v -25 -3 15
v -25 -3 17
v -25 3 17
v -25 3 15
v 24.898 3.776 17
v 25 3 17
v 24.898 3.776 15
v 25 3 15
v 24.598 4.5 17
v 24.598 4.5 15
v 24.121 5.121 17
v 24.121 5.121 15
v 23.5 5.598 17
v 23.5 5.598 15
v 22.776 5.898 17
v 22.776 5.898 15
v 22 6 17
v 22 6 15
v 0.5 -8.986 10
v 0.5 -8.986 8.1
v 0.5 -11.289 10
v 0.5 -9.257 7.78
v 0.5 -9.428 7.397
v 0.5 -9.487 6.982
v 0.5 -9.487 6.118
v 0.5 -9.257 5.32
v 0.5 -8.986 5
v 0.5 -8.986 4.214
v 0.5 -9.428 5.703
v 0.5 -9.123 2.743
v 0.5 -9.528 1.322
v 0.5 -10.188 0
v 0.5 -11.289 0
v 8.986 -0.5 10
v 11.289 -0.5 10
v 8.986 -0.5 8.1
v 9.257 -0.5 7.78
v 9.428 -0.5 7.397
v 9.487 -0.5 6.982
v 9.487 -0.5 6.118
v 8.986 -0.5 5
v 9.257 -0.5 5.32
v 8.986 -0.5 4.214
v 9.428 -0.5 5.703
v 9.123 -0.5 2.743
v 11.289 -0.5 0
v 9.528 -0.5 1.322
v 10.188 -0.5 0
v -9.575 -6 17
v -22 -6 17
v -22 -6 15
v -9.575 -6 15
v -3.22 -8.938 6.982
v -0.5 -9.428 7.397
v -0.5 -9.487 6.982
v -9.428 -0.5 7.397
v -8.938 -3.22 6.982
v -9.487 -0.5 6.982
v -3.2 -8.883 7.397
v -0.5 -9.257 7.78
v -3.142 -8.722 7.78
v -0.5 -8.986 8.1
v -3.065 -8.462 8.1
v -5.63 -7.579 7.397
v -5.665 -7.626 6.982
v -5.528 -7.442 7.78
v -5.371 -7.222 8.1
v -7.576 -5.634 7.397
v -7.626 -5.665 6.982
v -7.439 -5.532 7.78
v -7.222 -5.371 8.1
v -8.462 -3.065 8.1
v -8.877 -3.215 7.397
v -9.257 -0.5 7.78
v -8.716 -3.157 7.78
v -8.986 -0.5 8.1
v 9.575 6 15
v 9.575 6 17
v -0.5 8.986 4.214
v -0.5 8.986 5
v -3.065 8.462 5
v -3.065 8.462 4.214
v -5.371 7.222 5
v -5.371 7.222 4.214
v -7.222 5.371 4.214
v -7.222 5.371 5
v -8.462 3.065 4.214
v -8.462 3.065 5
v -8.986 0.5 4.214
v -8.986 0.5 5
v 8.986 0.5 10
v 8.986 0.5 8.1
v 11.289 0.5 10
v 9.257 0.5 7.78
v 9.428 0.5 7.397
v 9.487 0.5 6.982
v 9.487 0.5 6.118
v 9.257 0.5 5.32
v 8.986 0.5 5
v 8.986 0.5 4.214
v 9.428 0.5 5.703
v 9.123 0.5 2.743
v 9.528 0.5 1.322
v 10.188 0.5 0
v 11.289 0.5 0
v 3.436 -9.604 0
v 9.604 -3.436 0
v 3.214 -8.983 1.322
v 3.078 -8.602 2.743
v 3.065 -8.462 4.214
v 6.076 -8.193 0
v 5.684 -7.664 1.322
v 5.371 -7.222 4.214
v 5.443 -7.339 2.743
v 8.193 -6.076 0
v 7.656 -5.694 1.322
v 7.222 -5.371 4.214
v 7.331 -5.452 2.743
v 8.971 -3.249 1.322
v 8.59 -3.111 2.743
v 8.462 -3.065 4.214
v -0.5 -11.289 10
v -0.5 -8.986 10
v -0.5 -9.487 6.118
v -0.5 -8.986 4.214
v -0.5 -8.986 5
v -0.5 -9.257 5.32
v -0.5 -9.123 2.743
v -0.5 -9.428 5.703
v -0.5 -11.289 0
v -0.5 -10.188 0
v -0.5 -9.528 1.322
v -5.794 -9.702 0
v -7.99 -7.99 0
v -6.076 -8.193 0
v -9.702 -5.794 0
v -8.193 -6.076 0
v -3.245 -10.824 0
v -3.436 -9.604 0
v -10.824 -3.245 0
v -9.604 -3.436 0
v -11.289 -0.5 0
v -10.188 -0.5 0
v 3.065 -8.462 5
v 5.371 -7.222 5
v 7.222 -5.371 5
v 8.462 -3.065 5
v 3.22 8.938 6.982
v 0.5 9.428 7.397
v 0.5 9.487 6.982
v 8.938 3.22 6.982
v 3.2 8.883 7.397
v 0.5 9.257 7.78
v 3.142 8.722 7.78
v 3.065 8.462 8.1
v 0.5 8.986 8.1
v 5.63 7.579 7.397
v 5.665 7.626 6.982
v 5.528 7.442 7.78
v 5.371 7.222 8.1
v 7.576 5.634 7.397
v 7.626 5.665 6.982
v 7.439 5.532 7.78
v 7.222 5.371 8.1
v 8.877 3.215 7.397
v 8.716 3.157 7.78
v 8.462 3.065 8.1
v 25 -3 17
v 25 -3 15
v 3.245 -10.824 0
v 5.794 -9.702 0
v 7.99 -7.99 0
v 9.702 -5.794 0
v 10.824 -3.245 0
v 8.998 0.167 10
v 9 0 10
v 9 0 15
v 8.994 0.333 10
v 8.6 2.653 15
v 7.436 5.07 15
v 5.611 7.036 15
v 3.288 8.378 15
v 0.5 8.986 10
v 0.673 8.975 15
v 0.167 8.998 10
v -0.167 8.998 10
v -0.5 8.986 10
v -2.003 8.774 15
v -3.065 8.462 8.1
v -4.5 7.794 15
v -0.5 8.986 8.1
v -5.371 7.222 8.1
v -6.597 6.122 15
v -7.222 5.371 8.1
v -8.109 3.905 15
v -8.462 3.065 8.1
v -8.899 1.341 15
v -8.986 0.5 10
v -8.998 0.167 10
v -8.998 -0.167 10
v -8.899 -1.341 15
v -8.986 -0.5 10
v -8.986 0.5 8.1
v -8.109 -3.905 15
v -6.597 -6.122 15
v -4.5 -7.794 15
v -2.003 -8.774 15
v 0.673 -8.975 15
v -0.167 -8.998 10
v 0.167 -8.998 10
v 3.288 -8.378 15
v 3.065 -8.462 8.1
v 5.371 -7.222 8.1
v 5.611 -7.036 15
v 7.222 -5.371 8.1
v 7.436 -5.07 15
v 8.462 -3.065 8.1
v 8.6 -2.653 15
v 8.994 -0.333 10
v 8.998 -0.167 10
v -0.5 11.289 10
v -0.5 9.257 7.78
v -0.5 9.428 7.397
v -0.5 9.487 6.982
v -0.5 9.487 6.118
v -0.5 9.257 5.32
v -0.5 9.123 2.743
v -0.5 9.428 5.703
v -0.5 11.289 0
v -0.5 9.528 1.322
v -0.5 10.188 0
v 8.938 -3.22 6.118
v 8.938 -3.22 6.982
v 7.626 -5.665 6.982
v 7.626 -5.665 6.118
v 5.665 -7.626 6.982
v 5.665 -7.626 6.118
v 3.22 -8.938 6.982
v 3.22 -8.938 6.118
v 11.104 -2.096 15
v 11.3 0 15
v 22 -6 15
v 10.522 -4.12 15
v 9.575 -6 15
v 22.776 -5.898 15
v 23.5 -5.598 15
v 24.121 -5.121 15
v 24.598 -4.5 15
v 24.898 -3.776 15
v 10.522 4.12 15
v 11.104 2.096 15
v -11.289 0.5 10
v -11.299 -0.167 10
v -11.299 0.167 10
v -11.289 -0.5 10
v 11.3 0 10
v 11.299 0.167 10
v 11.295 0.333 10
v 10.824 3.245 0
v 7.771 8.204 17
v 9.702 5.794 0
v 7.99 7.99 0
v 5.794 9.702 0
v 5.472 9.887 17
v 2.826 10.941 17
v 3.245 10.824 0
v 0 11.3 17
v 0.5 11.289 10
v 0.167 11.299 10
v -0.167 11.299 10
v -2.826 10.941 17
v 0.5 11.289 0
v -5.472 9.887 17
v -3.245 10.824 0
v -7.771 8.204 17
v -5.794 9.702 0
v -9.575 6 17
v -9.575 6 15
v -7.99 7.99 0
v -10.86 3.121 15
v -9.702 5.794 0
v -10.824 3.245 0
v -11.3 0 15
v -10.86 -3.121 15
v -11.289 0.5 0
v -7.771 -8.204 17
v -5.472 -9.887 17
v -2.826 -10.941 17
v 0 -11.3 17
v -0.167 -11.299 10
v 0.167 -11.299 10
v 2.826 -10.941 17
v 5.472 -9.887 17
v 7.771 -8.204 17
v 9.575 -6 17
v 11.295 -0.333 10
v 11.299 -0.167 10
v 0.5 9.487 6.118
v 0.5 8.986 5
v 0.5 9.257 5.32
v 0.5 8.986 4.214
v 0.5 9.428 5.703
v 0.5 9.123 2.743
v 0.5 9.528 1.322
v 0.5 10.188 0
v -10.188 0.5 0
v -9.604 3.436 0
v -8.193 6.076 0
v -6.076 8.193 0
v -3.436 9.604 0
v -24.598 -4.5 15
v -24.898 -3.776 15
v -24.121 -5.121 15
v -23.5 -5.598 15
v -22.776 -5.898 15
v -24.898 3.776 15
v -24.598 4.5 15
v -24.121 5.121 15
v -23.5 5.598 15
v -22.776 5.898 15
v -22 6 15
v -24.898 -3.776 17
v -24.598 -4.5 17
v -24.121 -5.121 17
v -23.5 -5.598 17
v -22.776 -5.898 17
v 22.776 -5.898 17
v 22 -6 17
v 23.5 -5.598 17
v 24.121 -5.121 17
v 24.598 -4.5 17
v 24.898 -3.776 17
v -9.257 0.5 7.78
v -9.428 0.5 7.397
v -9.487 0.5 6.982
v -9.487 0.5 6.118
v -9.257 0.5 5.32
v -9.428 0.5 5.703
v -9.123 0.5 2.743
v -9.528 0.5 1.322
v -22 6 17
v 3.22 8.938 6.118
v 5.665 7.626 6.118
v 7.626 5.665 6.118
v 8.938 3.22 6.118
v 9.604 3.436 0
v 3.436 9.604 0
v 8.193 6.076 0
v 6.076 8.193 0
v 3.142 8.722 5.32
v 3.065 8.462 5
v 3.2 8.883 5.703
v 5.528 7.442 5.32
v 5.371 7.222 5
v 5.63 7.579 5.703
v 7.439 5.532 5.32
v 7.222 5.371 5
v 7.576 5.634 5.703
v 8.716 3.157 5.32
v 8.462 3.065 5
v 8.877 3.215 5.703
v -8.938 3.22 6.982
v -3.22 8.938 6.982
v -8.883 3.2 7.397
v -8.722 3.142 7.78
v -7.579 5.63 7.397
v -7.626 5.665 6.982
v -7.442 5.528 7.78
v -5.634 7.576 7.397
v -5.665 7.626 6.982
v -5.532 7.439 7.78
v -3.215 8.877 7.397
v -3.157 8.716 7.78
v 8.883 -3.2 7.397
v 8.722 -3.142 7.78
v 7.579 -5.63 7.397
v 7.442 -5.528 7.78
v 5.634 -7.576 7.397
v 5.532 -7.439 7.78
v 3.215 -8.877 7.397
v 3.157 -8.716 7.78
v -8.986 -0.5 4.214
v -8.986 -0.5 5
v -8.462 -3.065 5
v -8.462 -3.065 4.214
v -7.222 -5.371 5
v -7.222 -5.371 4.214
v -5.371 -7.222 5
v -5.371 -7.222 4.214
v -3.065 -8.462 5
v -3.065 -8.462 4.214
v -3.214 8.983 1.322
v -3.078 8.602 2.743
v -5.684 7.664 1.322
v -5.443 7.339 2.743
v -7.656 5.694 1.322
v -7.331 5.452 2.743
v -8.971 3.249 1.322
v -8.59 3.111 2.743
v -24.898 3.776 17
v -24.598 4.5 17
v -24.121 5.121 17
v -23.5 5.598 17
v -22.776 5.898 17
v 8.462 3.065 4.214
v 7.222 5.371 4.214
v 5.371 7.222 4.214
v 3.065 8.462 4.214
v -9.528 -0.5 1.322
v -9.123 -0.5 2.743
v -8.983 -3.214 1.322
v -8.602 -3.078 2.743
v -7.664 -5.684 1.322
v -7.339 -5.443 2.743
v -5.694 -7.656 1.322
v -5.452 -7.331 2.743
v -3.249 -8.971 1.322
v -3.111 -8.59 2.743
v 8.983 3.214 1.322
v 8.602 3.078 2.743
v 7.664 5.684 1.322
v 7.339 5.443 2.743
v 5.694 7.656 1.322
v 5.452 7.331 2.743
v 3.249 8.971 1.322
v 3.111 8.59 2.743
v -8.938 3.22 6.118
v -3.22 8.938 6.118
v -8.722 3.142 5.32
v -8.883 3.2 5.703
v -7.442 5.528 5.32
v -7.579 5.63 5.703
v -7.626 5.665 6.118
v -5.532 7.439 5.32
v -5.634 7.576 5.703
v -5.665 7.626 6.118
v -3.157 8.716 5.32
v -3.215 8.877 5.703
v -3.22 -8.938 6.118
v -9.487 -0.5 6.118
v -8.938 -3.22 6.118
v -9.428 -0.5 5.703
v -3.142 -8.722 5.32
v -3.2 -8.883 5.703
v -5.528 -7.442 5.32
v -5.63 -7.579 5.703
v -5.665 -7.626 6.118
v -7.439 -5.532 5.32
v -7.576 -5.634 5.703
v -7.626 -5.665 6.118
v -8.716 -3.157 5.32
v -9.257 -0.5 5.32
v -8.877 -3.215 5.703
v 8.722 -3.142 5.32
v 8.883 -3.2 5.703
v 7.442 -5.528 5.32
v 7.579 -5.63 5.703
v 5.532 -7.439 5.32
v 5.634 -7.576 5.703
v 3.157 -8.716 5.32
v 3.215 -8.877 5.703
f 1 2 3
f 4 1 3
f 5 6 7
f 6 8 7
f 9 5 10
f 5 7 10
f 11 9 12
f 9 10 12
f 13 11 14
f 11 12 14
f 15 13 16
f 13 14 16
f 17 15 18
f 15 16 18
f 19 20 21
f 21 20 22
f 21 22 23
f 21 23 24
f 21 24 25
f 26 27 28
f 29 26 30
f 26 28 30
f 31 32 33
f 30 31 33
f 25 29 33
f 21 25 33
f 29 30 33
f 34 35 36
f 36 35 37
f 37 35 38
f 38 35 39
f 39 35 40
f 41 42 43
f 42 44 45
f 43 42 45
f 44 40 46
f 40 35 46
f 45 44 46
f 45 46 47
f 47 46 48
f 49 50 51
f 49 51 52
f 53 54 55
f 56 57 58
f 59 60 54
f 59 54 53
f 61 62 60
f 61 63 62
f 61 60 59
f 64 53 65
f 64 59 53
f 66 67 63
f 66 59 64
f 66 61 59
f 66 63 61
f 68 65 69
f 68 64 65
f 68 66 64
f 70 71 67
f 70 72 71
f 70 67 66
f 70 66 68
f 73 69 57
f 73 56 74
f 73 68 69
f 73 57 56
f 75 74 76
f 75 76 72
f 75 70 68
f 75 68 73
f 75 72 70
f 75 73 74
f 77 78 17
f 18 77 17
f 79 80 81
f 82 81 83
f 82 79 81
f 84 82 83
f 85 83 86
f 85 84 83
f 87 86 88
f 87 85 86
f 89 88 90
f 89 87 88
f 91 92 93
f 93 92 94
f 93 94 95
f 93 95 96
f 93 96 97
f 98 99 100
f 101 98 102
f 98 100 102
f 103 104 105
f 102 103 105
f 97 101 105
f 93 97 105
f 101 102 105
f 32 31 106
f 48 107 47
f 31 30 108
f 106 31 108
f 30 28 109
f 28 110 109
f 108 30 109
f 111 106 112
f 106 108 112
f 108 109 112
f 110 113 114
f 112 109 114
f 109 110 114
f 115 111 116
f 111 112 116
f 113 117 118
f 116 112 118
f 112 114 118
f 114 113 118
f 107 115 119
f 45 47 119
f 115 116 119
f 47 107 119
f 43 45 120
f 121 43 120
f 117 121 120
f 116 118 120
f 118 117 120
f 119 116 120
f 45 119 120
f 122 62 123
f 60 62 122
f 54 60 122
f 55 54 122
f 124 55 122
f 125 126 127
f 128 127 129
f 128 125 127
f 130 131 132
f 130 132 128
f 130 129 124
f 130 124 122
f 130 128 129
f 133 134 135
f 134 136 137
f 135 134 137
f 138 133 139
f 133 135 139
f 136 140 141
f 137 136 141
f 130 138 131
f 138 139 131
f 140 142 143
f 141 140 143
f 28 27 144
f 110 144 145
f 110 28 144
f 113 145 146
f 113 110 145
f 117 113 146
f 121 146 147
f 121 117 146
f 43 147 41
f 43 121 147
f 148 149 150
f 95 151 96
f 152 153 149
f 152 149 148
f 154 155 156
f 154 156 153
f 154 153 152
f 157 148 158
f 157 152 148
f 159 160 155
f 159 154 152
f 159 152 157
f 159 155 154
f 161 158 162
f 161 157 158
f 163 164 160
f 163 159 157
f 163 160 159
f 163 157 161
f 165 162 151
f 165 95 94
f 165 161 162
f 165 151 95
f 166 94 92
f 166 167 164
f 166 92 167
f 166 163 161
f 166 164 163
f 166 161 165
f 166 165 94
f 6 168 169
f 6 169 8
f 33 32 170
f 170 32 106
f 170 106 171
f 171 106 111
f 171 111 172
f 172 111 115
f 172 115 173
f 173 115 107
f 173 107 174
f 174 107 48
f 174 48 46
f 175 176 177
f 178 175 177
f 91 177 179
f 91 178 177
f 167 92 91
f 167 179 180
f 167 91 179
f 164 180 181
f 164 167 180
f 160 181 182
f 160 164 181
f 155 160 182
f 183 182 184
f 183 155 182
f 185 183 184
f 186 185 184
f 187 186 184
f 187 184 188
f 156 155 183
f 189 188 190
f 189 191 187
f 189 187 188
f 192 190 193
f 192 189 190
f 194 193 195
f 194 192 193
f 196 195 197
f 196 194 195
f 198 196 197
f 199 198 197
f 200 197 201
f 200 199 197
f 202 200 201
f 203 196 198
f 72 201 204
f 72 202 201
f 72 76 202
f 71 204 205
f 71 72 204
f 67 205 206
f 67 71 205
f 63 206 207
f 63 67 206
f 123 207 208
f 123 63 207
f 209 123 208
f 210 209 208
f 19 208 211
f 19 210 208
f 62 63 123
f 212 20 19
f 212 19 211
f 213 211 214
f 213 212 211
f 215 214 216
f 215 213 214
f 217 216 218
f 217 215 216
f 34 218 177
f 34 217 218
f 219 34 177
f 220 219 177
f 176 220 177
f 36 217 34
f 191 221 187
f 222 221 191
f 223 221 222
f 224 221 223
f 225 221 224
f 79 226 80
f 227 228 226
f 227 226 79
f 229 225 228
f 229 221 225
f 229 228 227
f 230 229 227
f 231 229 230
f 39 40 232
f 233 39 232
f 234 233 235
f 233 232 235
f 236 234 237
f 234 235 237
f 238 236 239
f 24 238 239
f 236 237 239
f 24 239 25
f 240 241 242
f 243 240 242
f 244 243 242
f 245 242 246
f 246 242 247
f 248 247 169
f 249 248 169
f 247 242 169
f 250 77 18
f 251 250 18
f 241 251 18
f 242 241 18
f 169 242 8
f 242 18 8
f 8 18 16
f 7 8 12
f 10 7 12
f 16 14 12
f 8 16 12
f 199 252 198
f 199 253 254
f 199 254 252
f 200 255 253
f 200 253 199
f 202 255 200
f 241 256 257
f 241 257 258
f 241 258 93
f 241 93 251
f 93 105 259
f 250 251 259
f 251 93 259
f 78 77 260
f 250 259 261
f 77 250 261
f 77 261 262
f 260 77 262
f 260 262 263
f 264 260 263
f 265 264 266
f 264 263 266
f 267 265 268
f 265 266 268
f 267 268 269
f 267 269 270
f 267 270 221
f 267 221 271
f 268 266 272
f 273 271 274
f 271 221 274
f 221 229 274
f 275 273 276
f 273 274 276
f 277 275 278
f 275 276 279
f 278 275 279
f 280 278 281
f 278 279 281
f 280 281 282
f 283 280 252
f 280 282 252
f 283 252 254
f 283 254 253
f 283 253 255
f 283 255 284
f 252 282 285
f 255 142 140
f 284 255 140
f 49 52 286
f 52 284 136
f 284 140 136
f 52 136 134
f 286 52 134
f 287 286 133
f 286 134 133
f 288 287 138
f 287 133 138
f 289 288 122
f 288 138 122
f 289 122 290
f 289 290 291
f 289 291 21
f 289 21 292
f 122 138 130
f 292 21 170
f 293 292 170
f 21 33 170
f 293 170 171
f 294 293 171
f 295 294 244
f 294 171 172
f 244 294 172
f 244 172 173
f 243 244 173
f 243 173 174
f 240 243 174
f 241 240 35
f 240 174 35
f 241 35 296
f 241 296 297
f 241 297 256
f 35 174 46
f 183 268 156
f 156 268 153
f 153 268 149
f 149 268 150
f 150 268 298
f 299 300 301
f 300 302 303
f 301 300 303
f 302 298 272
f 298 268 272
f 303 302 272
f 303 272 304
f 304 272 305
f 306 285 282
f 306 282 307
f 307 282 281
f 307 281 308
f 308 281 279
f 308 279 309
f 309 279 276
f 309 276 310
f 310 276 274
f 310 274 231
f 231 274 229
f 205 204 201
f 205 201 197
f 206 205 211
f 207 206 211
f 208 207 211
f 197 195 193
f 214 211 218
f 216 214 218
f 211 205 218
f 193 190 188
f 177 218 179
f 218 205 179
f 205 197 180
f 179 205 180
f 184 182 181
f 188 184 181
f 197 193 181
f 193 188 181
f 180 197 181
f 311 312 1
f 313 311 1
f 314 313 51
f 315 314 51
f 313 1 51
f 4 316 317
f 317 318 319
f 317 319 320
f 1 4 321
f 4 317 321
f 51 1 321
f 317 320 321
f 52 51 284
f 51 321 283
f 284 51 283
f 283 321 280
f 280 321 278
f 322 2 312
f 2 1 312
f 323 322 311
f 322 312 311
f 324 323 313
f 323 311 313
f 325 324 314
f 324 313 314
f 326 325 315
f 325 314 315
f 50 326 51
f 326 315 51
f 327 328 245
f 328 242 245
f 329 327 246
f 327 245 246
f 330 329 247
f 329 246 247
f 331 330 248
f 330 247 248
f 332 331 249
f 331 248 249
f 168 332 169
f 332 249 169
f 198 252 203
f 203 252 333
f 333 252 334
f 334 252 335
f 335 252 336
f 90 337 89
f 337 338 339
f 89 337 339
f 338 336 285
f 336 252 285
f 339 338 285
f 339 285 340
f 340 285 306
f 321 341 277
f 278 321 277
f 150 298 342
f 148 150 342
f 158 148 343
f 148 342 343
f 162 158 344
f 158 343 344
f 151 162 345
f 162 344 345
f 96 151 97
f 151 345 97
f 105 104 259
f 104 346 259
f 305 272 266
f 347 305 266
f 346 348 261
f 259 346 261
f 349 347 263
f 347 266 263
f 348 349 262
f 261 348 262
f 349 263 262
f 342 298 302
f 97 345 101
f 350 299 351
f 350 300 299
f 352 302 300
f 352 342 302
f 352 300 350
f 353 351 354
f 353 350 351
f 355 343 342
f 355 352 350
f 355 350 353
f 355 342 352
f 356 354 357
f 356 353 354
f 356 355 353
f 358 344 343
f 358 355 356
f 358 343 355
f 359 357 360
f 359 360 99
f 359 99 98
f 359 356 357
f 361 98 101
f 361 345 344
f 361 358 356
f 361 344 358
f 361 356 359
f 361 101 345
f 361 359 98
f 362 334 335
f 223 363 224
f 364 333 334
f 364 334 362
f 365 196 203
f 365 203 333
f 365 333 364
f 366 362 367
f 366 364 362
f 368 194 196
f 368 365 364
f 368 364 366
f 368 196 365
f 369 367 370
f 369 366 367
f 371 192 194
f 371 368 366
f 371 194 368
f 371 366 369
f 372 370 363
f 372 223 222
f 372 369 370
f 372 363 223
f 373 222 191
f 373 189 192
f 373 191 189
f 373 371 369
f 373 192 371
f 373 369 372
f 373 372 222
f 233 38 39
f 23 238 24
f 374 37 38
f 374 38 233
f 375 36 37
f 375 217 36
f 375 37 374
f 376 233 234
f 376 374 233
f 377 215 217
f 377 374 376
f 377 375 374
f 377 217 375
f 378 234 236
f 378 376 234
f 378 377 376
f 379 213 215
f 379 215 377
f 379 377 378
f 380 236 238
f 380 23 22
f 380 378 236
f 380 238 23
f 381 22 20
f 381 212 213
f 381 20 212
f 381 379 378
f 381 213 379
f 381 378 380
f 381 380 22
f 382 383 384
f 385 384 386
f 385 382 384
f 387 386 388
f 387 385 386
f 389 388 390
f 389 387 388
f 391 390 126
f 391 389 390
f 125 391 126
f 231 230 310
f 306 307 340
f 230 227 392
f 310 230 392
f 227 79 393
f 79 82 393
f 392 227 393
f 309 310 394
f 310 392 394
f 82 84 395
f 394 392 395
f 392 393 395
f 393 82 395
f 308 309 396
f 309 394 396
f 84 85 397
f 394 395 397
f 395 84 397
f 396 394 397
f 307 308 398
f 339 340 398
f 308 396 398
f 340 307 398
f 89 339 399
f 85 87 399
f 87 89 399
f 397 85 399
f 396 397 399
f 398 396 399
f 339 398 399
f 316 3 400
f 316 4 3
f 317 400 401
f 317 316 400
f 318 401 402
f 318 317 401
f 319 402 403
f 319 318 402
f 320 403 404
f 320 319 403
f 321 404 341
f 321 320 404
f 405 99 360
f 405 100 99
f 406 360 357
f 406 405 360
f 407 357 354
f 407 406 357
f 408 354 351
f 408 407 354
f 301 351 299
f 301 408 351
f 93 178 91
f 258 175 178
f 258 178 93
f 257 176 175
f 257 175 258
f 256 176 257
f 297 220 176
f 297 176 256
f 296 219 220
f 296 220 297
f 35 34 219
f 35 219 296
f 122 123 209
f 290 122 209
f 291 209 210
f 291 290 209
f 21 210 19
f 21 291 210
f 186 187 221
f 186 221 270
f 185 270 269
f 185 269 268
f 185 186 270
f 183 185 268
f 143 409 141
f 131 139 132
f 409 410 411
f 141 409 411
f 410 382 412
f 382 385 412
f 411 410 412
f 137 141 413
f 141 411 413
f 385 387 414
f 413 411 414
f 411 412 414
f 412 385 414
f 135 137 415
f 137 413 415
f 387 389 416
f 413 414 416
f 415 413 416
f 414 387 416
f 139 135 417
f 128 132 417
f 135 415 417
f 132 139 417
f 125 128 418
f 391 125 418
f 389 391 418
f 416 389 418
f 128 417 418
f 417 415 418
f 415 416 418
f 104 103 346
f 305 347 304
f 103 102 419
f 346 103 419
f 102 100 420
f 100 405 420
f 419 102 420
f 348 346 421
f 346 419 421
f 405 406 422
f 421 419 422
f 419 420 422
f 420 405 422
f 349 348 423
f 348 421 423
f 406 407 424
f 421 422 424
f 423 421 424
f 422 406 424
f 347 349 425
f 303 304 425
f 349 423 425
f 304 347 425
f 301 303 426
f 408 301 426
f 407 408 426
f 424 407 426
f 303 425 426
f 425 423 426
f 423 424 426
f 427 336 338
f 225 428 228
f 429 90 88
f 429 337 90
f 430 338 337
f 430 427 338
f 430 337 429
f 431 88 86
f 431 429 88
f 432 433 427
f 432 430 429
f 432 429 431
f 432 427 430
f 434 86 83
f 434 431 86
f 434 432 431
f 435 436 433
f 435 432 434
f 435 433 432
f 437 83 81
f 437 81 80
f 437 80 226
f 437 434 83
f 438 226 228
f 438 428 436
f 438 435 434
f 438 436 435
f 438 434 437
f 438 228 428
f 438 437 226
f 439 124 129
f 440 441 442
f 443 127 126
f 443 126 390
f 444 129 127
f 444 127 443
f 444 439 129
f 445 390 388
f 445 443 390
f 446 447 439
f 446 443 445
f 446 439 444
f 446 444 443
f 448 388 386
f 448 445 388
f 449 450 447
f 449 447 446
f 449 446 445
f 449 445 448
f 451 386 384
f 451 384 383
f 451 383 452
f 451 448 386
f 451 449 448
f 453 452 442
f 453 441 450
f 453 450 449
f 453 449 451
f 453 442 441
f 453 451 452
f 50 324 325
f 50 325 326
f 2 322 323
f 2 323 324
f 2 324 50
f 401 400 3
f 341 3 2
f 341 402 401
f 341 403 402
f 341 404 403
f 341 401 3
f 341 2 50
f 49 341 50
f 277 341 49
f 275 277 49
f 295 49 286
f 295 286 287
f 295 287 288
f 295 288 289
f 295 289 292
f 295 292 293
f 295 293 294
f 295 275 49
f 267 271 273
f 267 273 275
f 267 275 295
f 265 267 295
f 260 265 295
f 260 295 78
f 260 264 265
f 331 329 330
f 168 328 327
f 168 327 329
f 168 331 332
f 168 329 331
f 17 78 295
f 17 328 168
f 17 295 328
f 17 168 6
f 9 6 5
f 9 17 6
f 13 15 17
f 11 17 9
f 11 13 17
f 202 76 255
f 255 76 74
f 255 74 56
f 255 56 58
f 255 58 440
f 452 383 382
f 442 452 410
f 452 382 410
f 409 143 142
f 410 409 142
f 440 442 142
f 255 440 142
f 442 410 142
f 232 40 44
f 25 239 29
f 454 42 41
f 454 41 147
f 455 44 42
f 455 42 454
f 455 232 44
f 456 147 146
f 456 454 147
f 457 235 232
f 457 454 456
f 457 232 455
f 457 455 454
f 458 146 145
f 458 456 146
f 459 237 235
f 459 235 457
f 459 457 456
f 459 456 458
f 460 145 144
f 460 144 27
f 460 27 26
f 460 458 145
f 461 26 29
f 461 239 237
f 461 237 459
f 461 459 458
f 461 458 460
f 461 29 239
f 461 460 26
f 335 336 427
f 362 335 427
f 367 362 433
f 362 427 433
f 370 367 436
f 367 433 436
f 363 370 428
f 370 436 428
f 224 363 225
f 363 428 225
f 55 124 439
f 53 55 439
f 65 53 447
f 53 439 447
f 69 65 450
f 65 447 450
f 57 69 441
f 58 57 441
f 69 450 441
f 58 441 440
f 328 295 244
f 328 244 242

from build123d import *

# Parameters (mm, degrees)
F0_R         = 11.3
F0_R_2       = 9
F1_DEPTH     = 15
F2_R         = 11.3
F3_DEPTH     = 2
F5_START     = -5
F4_R         = 9.5
F4_R_2       = 7.1437360255
F5_DEPTH     = 3.1
F7_W         = 50
F7_H         = 12
F8_DEPTH     = 2
F9_R         = 3
F10_W        = 1
F10_H        = 12
F10_W_2      = 12
F10_H_2      = 1
F11_DEPTH    = 10
F12_SIZE     = 1.2
F13_T2_ANGLE = 179.6107254138
F13_T4_ANGLE = 179.6107254138
F13_T6_ANGLE = 179.6107254138
F13_T8_ANGLE = 179.6107254138


# Not quite as in the source:
# - a fillet or chamfer that OpenCascade refuses, or shapes differently, is made with other operations: its cross-section is extruded or revolved along the edge and cut away or added


with BuildPart() as f1:
    # F0 (on Top) → F1 (new body)
    with BuildSketch(Plane.XY):
        Circle(F0_R)
        Circle(F0_R_2, mode=Mode.SUBTRACT)
    extrude(amount=F1_DEPTH)

    # F2 (on face) → F3 (join)
    with BuildSketch(Plane.XY.offset(15)):
        Circle(F2_R)
    extrude(amount=F3_DEPTH)

    # F4 (on face) → F5 (cut)
    with BuildSketch(Plane(origin=(0, 0, 0), x_dir=(1, 0, 0), z_dir=(0, 0, -1)).offset(F5_START)):
        Circle(F4_R)
        Circle(F4_R_2, mode=Mode.SUBTRACT)
    extrude(amount=-F5_DEPTH, mode=Mode.SUBTRACT)

    # F6: fillet of radius 1.5 on 3 edges, made by hand

    # F6_s1 → F6_t2 (revolve)
    with BuildSketch(Plane.XZ):
        with BuildLine():
            ThreePointArc((9, 5), (9.3693063938, 5.5056615531), (9.5, 6.1180339887))
            Line((9.5, 6.1180339887), (9.53, 6.1180339887))
            Line((9.53, 6.1180339887), (9.53, 5))
            Line((9.53, 5), (9.5, 4.97))
            ThreePointArc((9.5, 4.97), (9.25, 4.97), (9.02, 4.9776393202))
            Line((9.02, 4.9776393202), (9, 5))
        make_face()
    revolve(axis=Axis((0, 0, 5), (0, 0, -1)))

    # F6_s3 → F6_t4 (revolve)
    with BuildSketch(Plane.XZ):
        with BuildLine():
            ThreePointArc((9.5, 6.9819660113), (9.3693063938, 7.5943384469), (9, 8.1))
            Line((9, 8.1), (9.02, 8.1223606798))
            ThreePointArc((9.02, 8.1223606798), (9.25, 8.13), (9.5, 8.13))
            Line((9.5, 8.13), (9.53, 8.1))
            Line((9.53, 8.1), (9.53, 6.9819660113))
            Line((9.53, 6.9819660113), (9.5, 6.9819660113))
        make_face()
    revolve(axis=Axis((0, 0, 8.1), (0, 0, -1)))

    # F7 (on face) → F8 (join)
    with BuildSketch(Plane.XY.offset(17)):
        Rectangle(F7_W, F7_H)
    extrude(amount=-F8_DEPTH)

    # F9
    f9_edges = [f1.edges().sort_by_distance(p)[0] for p in [
        (-25, 6, 16),
        (-25, -6, 16),
        (25, 6, 16),
        (25, -6, 16),
    ]]
    fillet(f9_edges, radius=F9_R)

    # F10 (on face) → F11 (cut)
    with BuildSketch(Plane(origin=(0, 0, 0), x_dir=(1, 0, 0), z_dir=(0, 0, -1))):
        with Locations((0, -6.5)):
            Rectangle(F10_W, F10_H)
        with Locations((-6.5, 0)):
            Rectangle(F10_W_2, F10_H_2)
        Rectangle(F10_W, F10_H_2)
        with Locations((6.5, 0)):
            Rectangle(F10_W_2, F10_H_2)
        with Locations((0, 6.5)):
            Rectangle(F10_W, F10_H)
    extrude(amount=-F11_DEPTH, mode=Mode.SUBTRACT)

    # F12
    f12_edges = [f1.edges().sort_by_distance(p)[0] for p in [
        (6.363961, 6.363961, 0),
        (-6.363961, 6.363961, 0),
        (-6.363961, -6.363961, 0),
        (6.363961, -6.363961, 0),
    ]]
    chamfer(f12_edges, length=F12_SIZE)

    # F13: fillet of radius 8 on 4 edges, made by hand

    # F13_s1 → F13_t2 (revolve, cut)
    with BuildSketch(Plane(origin=(0, 0, 0), x_dir=(0, 0, 1), z_dir=(0.7095047819, -0.7047006205, 0))):
        with BuildLine():
            ThreePointArc((0, -10.2), (2.0233712711, -9.3058463753), (4.2142615011, -9))
            Line((4.2142615011, -9), (1.2, -9))
            Line((1.2, -9), (0, -10.2))
        make_face()
    revolve(axis=Axis((0, 0, 1.2), (0, 0, 1)), revolution_arc=F13_T2_ANGLE, mode=Mode.SUBTRACT)

    # F13_s3 → F13_t4 (revolve, cut)
    with BuildSketch(Plane(origin=(0, 0, 0), x_dir=(0, 0, 1), z_dir=(0.7047006205, 0.7095047819, 0))):
        with BuildLine():
            ThreePointArc((0, -10.2), (2.0233712711, -9.3058463753), (4.2142615011, -9))
            Line((4.2142615011, -9), (1.2, -9))
            Line((1.2, -9), (0, -10.2))
        make_face()
    revolve(axis=Axis((0, 0, 1.2), (0, 0, 1)), revolution_arc=F13_T4_ANGLE, mode=Mode.SUBTRACT)

    # F13_s5 → F13_t6 (revolve, cut)
    with BuildSketch(Plane(origin=(0, 0, 0), x_dir=(0, 0, 1), z_dir=(-0.7047006205, -0.7095047819, 0))):
        with BuildLine():
            ThreePointArc((0, -10.2), (2.0233712711, -9.3058463753), (4.2142615011, -9))
            Line((4.2142615011, -9), (1.2, -9))
            Line((1.2, -9), (0, -10.2))
        make_face()
    revolve(axis=Axis((0, 0, 1.2), (0, 0, 1)), revolution_arc=F13_T6_ANGLE, mode=Mode.SUBTRACT)

    # F13_s7 → F13_t8 (revolve, cut)
    with BuildSketch(Plane(origin=(0, 0, 0), x_dir=(0, 0, 1), z_dir=(-0.7095047819, 0.7047006205, 0))):
        with BuildLine():
            ThreePointArc((0, -10.2), (2.0233712711, -9.3058463753), (4.2142615011, -9))
            Line((4.2142615011, -9), (1.2, -9))
            Line((1.2, -9), (0, -10.2))
        make_face()
    revolve(axis=Axis((0, 0, 1.2), (0, 0, 1)), revolution_arc=F13_T8_ANGLE, mode=Mode.SUBTRACT)


solid = f1.part
